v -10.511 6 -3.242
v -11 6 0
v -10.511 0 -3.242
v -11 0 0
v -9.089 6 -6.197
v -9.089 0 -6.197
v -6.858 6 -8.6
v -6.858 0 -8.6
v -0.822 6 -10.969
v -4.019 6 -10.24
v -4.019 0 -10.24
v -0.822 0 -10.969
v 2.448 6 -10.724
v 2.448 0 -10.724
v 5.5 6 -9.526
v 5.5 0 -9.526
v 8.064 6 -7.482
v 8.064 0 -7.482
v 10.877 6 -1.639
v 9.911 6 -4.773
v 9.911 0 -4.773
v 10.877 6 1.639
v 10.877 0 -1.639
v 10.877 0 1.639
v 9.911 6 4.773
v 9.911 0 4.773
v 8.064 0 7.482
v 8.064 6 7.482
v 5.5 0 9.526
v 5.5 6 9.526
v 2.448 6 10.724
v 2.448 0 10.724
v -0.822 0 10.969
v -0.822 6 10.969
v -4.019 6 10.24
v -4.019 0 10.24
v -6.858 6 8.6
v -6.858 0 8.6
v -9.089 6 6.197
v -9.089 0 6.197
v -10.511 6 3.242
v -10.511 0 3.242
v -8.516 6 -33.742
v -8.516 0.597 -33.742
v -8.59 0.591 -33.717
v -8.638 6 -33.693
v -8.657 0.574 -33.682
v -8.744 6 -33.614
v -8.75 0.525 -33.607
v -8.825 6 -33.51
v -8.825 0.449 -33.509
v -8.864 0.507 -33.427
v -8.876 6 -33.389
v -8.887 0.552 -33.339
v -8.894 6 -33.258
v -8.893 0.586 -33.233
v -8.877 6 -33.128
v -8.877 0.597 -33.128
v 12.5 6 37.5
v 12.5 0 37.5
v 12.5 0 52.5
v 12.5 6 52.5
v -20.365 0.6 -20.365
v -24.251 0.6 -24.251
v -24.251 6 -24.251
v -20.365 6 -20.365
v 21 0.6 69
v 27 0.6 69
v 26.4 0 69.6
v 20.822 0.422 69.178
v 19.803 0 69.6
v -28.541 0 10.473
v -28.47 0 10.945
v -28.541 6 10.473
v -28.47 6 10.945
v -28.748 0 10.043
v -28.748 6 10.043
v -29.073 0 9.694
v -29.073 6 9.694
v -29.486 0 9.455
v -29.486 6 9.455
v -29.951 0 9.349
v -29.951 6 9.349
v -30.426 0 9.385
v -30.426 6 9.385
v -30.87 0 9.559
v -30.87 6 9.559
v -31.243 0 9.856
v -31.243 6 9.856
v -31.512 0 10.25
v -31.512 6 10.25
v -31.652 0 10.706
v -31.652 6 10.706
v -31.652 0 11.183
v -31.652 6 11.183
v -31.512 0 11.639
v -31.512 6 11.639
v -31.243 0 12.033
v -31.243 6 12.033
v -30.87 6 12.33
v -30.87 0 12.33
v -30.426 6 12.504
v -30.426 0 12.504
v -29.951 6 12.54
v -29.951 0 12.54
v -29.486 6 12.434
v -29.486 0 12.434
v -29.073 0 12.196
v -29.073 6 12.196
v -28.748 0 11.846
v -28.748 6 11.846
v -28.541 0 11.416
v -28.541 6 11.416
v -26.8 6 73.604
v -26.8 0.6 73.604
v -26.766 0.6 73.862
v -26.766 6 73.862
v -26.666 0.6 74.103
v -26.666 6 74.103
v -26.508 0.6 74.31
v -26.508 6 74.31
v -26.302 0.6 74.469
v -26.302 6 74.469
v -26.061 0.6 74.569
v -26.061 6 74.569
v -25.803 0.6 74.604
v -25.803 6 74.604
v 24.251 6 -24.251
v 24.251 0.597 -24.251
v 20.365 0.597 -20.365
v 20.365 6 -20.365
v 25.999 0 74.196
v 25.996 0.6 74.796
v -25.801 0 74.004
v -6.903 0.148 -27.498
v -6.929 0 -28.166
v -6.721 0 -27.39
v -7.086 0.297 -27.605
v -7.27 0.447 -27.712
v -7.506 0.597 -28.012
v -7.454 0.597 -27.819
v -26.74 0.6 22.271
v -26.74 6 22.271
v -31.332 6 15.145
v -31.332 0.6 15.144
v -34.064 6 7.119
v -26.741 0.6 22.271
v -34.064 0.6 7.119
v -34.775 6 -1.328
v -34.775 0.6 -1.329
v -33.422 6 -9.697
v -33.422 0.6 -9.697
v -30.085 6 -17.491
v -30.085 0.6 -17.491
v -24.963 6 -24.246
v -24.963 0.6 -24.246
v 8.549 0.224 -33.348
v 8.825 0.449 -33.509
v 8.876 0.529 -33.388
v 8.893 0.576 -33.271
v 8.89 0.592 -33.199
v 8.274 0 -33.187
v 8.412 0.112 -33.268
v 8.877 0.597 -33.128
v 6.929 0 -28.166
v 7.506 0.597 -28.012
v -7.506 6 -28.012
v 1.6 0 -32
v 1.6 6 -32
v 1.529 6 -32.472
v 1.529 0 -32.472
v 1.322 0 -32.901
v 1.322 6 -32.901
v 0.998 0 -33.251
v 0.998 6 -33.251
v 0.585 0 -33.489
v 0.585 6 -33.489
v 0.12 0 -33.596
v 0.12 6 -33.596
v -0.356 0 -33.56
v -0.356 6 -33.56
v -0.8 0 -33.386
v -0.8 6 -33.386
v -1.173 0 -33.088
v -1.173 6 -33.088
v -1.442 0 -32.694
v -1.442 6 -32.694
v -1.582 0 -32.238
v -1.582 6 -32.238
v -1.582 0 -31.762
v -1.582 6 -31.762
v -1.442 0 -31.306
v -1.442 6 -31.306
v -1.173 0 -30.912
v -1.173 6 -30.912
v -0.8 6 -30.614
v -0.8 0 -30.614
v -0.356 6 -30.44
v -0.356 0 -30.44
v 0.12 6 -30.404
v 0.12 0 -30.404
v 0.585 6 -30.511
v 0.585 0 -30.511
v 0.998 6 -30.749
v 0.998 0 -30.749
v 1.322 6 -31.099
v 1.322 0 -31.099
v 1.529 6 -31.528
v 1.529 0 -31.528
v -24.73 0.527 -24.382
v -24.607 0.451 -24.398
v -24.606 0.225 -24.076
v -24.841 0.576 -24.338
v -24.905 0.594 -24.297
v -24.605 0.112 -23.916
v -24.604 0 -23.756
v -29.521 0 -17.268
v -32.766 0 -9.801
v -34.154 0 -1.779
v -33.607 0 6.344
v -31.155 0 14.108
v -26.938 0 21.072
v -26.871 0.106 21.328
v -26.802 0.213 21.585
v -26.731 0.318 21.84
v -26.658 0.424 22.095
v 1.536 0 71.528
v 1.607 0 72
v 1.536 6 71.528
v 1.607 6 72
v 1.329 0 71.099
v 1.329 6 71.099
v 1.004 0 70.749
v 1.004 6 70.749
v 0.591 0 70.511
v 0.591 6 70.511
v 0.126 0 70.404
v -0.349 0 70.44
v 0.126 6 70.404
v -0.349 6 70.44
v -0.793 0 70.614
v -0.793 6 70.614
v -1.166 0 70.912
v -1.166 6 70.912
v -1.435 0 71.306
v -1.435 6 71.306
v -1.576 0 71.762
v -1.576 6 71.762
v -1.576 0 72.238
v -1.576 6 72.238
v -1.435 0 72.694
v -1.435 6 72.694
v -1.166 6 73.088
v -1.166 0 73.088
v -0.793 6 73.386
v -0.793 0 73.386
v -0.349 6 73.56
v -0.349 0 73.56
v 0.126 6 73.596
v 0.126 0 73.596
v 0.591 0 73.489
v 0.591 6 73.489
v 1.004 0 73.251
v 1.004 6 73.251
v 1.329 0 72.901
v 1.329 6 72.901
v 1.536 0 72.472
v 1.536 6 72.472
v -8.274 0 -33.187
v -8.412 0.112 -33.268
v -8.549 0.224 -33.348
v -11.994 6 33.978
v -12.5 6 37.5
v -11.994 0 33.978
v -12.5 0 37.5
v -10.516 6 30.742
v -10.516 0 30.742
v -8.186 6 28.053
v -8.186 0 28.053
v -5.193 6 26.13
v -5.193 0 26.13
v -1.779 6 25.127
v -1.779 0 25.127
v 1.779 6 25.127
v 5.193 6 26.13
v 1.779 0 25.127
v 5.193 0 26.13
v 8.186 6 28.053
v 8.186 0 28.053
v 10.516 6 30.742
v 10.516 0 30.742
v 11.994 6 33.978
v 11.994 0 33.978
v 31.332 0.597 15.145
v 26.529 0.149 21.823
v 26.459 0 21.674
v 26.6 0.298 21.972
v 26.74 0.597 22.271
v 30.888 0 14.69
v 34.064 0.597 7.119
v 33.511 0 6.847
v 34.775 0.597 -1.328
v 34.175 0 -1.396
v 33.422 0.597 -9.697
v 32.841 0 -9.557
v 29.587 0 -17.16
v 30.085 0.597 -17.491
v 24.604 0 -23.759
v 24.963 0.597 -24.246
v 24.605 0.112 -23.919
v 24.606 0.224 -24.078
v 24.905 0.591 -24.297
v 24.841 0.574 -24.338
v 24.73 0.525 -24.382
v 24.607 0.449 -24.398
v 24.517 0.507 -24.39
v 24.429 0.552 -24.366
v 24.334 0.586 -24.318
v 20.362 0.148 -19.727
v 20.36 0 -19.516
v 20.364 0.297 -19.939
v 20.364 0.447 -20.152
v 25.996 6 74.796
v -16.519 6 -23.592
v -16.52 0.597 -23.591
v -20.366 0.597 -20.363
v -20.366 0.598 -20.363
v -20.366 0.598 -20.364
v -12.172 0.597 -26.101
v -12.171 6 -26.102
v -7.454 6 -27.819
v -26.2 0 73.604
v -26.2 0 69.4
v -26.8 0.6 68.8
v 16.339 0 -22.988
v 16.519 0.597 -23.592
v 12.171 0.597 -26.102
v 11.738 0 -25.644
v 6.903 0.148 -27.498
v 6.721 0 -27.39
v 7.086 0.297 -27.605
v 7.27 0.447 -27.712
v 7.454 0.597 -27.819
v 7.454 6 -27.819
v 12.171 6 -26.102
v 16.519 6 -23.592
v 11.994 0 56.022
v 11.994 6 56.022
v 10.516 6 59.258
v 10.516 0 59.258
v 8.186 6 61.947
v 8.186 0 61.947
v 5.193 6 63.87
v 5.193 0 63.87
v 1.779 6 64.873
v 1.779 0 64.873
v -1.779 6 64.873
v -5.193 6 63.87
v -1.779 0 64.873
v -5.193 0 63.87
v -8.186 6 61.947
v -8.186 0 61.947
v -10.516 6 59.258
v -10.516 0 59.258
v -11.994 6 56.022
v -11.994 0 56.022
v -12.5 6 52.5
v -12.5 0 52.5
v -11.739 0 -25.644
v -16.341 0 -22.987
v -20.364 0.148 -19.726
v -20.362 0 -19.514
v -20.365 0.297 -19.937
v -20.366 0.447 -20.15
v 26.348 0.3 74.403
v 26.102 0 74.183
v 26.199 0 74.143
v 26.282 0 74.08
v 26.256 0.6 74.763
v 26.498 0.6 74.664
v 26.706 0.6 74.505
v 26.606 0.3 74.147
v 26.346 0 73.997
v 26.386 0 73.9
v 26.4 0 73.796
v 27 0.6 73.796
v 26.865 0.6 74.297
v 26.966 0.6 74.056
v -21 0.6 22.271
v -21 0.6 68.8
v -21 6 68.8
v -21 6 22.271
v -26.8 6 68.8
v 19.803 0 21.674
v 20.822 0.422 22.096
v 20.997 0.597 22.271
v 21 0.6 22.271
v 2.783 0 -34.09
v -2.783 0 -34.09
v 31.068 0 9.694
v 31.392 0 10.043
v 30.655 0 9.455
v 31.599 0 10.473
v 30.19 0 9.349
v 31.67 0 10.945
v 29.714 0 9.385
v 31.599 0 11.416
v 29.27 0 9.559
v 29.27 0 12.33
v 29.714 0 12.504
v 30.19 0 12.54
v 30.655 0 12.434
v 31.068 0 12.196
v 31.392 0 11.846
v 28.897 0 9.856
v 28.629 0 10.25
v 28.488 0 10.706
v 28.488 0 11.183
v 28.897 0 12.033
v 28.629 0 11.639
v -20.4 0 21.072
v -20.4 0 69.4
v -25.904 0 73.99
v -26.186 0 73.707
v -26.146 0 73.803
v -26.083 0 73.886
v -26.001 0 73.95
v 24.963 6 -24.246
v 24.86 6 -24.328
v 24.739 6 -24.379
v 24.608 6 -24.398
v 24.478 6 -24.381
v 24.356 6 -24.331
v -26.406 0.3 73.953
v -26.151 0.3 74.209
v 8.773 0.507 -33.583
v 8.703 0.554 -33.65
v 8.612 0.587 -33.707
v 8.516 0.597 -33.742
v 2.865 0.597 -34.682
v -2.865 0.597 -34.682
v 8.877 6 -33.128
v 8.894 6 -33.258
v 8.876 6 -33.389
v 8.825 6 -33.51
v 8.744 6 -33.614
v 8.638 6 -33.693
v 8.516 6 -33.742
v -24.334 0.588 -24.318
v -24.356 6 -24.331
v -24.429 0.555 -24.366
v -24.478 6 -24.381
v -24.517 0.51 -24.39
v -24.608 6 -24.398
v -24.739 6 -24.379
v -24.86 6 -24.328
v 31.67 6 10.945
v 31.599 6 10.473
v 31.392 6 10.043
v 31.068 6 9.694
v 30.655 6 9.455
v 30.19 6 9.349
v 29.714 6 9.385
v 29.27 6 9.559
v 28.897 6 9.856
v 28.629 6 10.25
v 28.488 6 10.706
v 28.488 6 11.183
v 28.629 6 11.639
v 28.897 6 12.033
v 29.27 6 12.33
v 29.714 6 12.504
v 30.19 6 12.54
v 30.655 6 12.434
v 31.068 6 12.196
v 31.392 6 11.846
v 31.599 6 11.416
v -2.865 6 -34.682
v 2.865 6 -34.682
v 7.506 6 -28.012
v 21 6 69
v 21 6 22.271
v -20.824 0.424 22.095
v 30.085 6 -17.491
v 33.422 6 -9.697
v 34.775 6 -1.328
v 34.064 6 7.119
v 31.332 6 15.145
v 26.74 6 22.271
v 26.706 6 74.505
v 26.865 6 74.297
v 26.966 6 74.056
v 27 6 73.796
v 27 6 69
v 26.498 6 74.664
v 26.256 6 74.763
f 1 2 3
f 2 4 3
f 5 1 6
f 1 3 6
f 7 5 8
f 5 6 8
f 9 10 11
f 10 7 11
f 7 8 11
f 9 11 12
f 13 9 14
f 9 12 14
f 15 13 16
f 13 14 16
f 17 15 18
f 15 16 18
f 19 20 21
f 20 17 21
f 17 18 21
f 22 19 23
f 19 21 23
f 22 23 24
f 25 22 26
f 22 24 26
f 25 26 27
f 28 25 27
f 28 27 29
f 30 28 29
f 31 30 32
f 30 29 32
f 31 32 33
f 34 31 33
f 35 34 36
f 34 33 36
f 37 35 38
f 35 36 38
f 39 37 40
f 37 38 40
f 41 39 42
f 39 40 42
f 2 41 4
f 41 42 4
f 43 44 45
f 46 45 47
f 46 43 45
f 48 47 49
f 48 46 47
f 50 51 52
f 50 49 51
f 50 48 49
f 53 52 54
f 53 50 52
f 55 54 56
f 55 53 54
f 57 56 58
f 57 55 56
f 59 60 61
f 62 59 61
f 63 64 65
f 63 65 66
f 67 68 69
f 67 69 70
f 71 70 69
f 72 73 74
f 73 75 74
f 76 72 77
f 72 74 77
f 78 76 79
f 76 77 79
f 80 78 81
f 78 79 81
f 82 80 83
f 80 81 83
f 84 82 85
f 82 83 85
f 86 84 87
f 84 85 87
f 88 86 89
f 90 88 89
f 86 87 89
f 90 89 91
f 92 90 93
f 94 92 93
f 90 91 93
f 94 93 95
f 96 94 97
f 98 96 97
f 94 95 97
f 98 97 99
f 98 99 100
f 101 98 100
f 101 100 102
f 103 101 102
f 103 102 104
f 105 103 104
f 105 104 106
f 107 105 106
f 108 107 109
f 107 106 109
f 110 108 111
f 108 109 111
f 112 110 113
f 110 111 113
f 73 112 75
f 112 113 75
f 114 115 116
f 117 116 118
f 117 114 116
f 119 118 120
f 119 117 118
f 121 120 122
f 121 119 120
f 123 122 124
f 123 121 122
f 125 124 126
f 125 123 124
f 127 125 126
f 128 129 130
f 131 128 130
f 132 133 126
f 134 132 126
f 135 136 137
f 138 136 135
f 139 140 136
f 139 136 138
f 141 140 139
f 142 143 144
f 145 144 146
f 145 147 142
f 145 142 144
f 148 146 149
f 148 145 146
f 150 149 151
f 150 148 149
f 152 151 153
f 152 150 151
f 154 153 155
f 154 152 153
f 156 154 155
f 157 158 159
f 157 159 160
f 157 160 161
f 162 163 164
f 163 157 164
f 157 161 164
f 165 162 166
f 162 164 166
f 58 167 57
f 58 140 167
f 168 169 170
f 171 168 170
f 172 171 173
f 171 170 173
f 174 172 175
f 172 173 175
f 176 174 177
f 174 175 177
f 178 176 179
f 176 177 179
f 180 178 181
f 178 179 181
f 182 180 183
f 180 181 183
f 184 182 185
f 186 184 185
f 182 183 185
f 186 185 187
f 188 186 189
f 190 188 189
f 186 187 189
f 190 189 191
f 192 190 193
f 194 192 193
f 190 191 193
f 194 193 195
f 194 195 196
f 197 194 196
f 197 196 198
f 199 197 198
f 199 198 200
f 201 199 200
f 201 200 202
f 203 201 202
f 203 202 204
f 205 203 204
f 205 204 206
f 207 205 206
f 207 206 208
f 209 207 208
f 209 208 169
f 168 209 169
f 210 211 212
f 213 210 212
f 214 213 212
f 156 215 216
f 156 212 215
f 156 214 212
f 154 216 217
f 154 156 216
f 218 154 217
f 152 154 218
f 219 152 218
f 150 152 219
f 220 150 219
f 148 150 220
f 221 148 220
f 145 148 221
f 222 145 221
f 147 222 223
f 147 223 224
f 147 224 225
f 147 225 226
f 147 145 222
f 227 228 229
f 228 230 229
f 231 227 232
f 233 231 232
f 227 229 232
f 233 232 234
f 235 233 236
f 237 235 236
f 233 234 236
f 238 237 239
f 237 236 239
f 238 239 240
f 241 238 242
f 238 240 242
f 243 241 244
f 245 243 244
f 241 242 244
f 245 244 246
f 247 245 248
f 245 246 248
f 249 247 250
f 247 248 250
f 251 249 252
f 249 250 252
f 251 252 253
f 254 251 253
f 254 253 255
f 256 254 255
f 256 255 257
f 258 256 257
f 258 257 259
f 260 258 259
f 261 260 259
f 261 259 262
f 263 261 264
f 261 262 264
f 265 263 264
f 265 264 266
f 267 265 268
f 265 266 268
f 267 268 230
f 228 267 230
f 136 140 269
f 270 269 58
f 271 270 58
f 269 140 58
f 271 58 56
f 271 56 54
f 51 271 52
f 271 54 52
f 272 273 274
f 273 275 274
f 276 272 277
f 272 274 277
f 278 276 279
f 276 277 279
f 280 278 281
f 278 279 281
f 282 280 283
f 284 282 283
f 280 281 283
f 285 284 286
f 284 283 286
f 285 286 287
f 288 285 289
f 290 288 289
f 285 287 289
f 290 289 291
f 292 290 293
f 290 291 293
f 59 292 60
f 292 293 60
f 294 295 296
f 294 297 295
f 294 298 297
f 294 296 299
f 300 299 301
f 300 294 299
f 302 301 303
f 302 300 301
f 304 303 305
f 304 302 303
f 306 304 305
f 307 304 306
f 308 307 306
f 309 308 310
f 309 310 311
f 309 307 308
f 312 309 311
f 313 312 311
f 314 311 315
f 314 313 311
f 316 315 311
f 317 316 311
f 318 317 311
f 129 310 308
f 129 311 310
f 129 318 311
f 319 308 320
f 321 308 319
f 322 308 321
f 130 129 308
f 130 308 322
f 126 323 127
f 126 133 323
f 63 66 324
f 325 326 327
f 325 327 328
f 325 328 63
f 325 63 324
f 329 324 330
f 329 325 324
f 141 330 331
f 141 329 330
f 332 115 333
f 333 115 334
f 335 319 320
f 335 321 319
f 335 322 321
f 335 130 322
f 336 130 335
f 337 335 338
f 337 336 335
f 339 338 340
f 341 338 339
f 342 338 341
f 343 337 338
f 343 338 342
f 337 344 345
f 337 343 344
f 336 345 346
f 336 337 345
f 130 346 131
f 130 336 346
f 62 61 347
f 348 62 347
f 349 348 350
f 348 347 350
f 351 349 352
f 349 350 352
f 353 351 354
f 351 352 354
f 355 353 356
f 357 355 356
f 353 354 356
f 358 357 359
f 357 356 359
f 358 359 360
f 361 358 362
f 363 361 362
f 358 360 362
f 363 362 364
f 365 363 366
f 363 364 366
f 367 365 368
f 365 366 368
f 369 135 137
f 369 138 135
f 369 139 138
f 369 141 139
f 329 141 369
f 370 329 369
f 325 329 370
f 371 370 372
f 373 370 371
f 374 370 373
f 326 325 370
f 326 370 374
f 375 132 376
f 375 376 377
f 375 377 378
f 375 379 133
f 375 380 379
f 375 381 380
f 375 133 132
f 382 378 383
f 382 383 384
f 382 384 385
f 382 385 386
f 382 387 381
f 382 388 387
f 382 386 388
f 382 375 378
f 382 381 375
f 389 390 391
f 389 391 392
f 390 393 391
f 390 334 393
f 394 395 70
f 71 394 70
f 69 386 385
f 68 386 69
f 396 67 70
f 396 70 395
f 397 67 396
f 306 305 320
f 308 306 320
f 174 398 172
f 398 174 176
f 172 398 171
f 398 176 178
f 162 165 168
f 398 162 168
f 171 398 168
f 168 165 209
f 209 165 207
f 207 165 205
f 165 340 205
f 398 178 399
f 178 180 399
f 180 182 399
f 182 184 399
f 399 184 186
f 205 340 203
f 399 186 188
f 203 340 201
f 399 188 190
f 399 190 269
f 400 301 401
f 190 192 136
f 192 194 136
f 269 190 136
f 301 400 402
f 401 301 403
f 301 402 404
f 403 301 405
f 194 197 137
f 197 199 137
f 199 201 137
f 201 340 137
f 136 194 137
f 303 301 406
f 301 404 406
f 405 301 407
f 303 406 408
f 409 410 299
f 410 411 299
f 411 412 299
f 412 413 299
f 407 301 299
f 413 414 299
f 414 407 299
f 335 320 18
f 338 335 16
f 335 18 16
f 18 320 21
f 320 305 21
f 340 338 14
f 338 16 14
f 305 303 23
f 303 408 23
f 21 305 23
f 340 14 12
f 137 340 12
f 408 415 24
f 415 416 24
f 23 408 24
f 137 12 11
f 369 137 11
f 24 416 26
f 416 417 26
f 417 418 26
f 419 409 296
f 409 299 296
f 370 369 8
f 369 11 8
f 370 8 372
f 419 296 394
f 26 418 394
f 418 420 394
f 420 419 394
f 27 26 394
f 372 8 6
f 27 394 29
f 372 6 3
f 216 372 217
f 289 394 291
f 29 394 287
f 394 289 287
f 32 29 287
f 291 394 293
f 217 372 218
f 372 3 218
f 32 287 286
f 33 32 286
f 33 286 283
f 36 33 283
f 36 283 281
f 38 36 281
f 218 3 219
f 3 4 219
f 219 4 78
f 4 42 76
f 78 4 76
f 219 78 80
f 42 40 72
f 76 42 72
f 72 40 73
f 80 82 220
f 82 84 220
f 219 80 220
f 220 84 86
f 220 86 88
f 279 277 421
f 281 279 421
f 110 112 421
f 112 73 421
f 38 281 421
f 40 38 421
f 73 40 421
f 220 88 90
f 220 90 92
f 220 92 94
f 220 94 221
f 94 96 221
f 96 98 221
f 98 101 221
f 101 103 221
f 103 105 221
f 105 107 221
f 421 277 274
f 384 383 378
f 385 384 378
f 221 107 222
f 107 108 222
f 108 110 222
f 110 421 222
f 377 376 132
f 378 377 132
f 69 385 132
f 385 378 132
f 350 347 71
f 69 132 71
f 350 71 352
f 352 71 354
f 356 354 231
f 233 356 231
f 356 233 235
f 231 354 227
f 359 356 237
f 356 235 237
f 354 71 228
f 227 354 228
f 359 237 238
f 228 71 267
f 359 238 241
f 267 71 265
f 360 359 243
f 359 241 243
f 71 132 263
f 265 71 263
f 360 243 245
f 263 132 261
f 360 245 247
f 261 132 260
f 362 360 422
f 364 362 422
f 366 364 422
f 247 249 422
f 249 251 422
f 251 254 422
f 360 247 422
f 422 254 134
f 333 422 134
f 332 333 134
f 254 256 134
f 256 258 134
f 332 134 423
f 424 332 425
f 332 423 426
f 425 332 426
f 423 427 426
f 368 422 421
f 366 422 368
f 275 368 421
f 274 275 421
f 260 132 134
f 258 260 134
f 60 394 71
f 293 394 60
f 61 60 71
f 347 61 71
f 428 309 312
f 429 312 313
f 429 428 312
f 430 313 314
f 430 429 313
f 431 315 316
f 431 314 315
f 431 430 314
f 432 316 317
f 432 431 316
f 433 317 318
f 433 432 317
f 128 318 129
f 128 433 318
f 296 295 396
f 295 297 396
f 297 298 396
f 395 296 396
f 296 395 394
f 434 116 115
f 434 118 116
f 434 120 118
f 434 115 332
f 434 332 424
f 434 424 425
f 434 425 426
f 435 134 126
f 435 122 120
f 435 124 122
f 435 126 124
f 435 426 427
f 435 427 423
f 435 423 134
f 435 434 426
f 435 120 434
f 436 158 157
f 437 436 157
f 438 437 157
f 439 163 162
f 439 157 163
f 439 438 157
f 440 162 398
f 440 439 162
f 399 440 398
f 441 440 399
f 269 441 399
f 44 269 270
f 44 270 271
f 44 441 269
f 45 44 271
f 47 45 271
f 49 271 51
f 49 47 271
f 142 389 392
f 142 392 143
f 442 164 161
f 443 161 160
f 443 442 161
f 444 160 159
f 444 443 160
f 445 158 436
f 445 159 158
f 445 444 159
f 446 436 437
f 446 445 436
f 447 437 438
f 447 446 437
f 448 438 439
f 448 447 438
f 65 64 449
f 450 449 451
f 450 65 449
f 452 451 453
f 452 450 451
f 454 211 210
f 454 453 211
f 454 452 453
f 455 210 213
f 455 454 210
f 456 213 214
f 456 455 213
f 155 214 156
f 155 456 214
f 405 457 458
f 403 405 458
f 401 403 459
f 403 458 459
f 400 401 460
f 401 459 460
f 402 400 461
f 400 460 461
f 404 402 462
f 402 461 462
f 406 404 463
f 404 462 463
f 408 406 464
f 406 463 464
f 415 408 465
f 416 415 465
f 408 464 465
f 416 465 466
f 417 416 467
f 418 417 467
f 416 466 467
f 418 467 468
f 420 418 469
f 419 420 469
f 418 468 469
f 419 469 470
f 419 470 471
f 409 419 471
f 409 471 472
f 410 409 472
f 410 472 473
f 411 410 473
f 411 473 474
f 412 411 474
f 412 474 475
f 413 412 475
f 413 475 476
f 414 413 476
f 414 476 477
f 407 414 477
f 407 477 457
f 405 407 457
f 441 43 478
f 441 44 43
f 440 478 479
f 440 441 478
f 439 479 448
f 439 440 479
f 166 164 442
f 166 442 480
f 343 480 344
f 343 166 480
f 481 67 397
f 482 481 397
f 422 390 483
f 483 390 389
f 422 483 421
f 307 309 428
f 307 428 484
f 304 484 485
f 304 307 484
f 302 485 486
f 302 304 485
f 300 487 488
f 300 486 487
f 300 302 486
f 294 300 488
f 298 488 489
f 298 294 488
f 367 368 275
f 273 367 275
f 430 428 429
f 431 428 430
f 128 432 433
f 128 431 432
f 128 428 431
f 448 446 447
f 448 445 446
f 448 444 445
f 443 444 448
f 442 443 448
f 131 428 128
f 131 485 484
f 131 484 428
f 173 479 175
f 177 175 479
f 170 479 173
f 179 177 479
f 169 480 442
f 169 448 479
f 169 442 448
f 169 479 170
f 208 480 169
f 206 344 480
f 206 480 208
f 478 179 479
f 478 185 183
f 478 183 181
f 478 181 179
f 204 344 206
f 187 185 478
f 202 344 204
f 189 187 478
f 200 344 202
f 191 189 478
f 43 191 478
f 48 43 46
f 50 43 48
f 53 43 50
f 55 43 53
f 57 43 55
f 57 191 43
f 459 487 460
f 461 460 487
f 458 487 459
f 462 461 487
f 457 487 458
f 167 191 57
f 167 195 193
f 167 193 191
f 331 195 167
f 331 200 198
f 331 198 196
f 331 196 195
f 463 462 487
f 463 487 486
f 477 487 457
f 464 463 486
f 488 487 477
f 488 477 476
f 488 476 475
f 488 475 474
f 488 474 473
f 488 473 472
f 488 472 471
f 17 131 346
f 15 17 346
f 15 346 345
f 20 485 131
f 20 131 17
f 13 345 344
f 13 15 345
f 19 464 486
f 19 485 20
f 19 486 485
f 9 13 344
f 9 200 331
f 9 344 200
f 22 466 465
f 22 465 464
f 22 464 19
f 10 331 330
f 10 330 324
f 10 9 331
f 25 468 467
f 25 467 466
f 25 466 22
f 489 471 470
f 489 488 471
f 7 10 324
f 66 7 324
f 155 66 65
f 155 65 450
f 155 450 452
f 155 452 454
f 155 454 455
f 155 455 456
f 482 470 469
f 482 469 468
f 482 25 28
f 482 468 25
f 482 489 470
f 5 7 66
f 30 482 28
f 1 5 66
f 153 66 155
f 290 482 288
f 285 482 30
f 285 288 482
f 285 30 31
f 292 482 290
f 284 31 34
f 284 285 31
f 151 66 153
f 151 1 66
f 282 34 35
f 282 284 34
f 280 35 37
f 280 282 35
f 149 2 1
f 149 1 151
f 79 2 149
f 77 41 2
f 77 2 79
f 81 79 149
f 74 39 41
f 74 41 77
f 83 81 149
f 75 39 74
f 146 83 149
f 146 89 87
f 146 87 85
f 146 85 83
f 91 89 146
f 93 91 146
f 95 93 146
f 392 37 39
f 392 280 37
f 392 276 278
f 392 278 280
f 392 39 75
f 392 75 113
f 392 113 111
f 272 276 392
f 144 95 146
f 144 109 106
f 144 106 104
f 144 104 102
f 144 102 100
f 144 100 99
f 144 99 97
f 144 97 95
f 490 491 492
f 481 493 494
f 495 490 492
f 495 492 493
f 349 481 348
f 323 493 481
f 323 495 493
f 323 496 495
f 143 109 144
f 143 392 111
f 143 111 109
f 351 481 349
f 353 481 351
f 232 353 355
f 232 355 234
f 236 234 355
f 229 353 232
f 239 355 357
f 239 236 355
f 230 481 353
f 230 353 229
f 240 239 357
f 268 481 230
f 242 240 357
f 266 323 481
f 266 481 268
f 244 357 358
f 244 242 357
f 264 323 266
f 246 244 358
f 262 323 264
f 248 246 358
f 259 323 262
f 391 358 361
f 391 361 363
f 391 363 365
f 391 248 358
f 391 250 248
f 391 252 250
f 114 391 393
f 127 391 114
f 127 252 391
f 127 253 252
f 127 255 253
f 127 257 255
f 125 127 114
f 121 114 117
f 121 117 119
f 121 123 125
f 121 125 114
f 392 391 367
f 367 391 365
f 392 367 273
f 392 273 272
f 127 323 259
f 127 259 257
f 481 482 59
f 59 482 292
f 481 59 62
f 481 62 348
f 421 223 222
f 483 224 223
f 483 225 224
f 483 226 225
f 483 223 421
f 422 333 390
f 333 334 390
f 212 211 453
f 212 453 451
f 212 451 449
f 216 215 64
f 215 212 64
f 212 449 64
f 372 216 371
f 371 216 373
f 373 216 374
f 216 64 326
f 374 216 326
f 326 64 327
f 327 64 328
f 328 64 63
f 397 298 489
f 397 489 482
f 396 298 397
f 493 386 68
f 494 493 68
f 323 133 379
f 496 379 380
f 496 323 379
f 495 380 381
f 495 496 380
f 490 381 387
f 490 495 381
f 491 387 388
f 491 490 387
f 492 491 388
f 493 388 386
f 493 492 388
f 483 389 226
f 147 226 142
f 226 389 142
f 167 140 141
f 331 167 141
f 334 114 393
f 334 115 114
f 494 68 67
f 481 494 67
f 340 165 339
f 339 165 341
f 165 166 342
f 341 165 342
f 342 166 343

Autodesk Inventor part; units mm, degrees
ref_plane "YZ Plane" through (0, 0, 0) normal (1, 0, 0) x (0, 1, 0)
ref_plane "XZ Plane" through (0, 0, 0) normal (0, 1, 0) x (-1, 0, 0)
ref_plane "XY Plane" through (0, 0, 0) normal (0, 0, 1) x (1, 0, 0)
sketch "Boceto1" plane through (0, 0, 0) normal (0, 1, 0) x (-1, 0, 0)
  line L0 (26.7996, 74.6) -> (26.8, 68.8)
  line L1 (21, 68.8) -> (21, 22.2711)
  line L2 (7.5058, -28.0118) -> (9.0069, -33.6142)
  line L3 (-9.0069, -33.6142) -> (-7.5058, -28.0118)
  line L4 (-7.5058, -28.0118) -> (-9.0069, -33.6142)
  line L5 (-20.5061, -20.5061) -> (-24.6073, -24.6073)
  line L6 (-20.5061, -20.5061) -> (-24.6073, -24.6073)
  circle A0 centre (0, 0) radius 11
  line L7 (-21, 69) -> (-21, 22.2711)
  line L8 (-21, 22.2711) -> (-21, 69)
  line L9 (-26.7402, 22.2711) -> (-21, 22.2711)
  line L10 (-27, 74.8) -> (26.7996, 74.6)
  arc A1 (-9.0069, -33.6142) -> (9.0069, -33.6142) centre (0, 0) ccw
  arc A2 (-26.7402, 22.2711) -> (-24.6073, -24.6073) centre (0, 0) ccw
  arc A3 (24.6073, -24.6073) -> (26.7402, 22.2711) centre (0, 0) ccw
  line L11 (26.8, 68.8) -> (21, 68.8)
  line L12 (21, 22.2711) -> (26.7402, 22.2711)
  line L13 (-27, 74.8) -> (-27, 69)
  line L14 (-27, 69) -> (-21, 69)
  line L15 (24.6073, -24.6073) -> (20.3647, -20.3647)
  line L16 (7.5058, -28.0118) -> (7.454, -27.8187)
  line L17 (-7.5058, -28.0118) -> (-7.454, -27.8187)
  line L18 (-20.5061, -20.5061) -> (-20.3647, -20.3647)
  arc A4 (-20.3647, -20.3647) -> (-7.454, -27.8187) centre (0, 0) ccw
  arc A5 (7.454, -27.8187) -> (20.3647, -20.3647) centre (0, 0) ccw
  point P0 (0, 0)
  point P1 (0, 0)
  dimension "d3" = 53.8
  dimension "d5" = 22
  dimension "d15" = 5.8
  dimension "d16" = 46.5289
extrude "Extrusión1" add sketch "Boceto1" along normal blind 6
fillet "Empalme2" radius 1 2 edges at (27, 3, 74.8) (-26.7996, 3, 74.6)
chamfer "Chaflán1" distance 0.6 angle 45 6 edges at (27, 0, 71.3981) (26.7058, 0, 74.5047) (0.0964, 0, 74.7) (-26.5081, 0, 74.3095) (-26.7998, 0, 71.2019) (24, 0, 69)
chamfer "Chaflán2" distance 0.6 angle 45 1 edges at (21, 0, 45.6355)
chamfer "Chaflán3" distance 0.6 angle 45 1 edges at (-21, 0, 45.5355)
chamfer "Chaflán4" distance 0.6 angle 45 2 edges at (-23.6, 0, 68.8) (-23.8701, 0, 22.2711)
chamfer "Chaflán5" distance 0.6 angle 45 3 edges at (-34.7443, 0, -1.9681) (-24.1144, 0, 21.6711) (-22.486, 0, -22.486)
chamfer "Chaflán6" distance 0.6 angle 45 9 edges at (-14.4, 0, -24.9415) (-8.2563, 0, -30.813) (0, 0, -34.8) (8.2563, 0, -30.813) (14.4, 0, -24.9415) (22.5567, 0, -22.5567) (34.764, 0, -1.5817) (23.8701, 0, 22.2711) (20.4, 0, 45.6355)
fillet "Empalme4" radius 0.5 4 edges at (-9.0069, 3.2998, -33.6142) (-24.6073, 3.2998, -24.6073) (9.0069, 3.2998, -33.6142) (24.6073, 3.2998, -24.6073)
sketch "Boceto2" plane through (0, 0, 0) normal (0, -1, 0) x (1, 0, 0)
  line L0 (0, 52.5) -> (0, 37.5) construction
  line L1 (-12.5, 52.5) -> (-12.5, 37.5)
  line L2 (12.5, 37.5) -> (12.5, 52.5)
  arc A0 (12.5, 52.5) -> (-12.5, 52.5) centre (0, 52.5) ccw
  arc A1 (-12.5, 37.5) -> (12.5, 37.5) centre (0, 37.5) ccw
  point P0 (0, 0)
  point P1 (0, 45)
  dimension "d43" = 25
  dimension "d44" = 15
  dimension "d45" = 37.5
extrude "Extrusión2" cut sketch "Boceto2" against normal blind 6
sketch "Boceto3" plane through (0, 6, 0) normal (0, 1, 0) x (1, 0, 0)
  circle A0 centre (0.0066, -72) radius 1.6
  circle A1 centre (0, 0) radius 32
  circle A2 centre (0, 32) radius 1.6
  circle A3 centre (-30.0702, -10.9446) radius 1.6
  circle A4 centre (30.0702, -10.9446) radius 1.6
  line L0 (0, 0) -> (-30.0702, -10.9446)
  line L1 (0, 0) -> (30.0702, -10.9446)
  line L2 (9.4586, 0) -> (-7.7353, 0)
  dimension "d48" = 64
  dimension "d49" = 3.2
  dimension "d50" = 20
  dimension "d51" = 20
  dimension "d53" = 72
extrude "Extrusión3" cut sketch "Boceto3" against normal through all contours A0 | A2 A1 | A1 A2 | A4 A1 | A1 L1 A4 | A1 A4 L1 | A3 L0 A1 | A1 A3 | L0 A3 A1
properties part number "Tapa de caja reductora - eje z" material "Plastico PETG"
